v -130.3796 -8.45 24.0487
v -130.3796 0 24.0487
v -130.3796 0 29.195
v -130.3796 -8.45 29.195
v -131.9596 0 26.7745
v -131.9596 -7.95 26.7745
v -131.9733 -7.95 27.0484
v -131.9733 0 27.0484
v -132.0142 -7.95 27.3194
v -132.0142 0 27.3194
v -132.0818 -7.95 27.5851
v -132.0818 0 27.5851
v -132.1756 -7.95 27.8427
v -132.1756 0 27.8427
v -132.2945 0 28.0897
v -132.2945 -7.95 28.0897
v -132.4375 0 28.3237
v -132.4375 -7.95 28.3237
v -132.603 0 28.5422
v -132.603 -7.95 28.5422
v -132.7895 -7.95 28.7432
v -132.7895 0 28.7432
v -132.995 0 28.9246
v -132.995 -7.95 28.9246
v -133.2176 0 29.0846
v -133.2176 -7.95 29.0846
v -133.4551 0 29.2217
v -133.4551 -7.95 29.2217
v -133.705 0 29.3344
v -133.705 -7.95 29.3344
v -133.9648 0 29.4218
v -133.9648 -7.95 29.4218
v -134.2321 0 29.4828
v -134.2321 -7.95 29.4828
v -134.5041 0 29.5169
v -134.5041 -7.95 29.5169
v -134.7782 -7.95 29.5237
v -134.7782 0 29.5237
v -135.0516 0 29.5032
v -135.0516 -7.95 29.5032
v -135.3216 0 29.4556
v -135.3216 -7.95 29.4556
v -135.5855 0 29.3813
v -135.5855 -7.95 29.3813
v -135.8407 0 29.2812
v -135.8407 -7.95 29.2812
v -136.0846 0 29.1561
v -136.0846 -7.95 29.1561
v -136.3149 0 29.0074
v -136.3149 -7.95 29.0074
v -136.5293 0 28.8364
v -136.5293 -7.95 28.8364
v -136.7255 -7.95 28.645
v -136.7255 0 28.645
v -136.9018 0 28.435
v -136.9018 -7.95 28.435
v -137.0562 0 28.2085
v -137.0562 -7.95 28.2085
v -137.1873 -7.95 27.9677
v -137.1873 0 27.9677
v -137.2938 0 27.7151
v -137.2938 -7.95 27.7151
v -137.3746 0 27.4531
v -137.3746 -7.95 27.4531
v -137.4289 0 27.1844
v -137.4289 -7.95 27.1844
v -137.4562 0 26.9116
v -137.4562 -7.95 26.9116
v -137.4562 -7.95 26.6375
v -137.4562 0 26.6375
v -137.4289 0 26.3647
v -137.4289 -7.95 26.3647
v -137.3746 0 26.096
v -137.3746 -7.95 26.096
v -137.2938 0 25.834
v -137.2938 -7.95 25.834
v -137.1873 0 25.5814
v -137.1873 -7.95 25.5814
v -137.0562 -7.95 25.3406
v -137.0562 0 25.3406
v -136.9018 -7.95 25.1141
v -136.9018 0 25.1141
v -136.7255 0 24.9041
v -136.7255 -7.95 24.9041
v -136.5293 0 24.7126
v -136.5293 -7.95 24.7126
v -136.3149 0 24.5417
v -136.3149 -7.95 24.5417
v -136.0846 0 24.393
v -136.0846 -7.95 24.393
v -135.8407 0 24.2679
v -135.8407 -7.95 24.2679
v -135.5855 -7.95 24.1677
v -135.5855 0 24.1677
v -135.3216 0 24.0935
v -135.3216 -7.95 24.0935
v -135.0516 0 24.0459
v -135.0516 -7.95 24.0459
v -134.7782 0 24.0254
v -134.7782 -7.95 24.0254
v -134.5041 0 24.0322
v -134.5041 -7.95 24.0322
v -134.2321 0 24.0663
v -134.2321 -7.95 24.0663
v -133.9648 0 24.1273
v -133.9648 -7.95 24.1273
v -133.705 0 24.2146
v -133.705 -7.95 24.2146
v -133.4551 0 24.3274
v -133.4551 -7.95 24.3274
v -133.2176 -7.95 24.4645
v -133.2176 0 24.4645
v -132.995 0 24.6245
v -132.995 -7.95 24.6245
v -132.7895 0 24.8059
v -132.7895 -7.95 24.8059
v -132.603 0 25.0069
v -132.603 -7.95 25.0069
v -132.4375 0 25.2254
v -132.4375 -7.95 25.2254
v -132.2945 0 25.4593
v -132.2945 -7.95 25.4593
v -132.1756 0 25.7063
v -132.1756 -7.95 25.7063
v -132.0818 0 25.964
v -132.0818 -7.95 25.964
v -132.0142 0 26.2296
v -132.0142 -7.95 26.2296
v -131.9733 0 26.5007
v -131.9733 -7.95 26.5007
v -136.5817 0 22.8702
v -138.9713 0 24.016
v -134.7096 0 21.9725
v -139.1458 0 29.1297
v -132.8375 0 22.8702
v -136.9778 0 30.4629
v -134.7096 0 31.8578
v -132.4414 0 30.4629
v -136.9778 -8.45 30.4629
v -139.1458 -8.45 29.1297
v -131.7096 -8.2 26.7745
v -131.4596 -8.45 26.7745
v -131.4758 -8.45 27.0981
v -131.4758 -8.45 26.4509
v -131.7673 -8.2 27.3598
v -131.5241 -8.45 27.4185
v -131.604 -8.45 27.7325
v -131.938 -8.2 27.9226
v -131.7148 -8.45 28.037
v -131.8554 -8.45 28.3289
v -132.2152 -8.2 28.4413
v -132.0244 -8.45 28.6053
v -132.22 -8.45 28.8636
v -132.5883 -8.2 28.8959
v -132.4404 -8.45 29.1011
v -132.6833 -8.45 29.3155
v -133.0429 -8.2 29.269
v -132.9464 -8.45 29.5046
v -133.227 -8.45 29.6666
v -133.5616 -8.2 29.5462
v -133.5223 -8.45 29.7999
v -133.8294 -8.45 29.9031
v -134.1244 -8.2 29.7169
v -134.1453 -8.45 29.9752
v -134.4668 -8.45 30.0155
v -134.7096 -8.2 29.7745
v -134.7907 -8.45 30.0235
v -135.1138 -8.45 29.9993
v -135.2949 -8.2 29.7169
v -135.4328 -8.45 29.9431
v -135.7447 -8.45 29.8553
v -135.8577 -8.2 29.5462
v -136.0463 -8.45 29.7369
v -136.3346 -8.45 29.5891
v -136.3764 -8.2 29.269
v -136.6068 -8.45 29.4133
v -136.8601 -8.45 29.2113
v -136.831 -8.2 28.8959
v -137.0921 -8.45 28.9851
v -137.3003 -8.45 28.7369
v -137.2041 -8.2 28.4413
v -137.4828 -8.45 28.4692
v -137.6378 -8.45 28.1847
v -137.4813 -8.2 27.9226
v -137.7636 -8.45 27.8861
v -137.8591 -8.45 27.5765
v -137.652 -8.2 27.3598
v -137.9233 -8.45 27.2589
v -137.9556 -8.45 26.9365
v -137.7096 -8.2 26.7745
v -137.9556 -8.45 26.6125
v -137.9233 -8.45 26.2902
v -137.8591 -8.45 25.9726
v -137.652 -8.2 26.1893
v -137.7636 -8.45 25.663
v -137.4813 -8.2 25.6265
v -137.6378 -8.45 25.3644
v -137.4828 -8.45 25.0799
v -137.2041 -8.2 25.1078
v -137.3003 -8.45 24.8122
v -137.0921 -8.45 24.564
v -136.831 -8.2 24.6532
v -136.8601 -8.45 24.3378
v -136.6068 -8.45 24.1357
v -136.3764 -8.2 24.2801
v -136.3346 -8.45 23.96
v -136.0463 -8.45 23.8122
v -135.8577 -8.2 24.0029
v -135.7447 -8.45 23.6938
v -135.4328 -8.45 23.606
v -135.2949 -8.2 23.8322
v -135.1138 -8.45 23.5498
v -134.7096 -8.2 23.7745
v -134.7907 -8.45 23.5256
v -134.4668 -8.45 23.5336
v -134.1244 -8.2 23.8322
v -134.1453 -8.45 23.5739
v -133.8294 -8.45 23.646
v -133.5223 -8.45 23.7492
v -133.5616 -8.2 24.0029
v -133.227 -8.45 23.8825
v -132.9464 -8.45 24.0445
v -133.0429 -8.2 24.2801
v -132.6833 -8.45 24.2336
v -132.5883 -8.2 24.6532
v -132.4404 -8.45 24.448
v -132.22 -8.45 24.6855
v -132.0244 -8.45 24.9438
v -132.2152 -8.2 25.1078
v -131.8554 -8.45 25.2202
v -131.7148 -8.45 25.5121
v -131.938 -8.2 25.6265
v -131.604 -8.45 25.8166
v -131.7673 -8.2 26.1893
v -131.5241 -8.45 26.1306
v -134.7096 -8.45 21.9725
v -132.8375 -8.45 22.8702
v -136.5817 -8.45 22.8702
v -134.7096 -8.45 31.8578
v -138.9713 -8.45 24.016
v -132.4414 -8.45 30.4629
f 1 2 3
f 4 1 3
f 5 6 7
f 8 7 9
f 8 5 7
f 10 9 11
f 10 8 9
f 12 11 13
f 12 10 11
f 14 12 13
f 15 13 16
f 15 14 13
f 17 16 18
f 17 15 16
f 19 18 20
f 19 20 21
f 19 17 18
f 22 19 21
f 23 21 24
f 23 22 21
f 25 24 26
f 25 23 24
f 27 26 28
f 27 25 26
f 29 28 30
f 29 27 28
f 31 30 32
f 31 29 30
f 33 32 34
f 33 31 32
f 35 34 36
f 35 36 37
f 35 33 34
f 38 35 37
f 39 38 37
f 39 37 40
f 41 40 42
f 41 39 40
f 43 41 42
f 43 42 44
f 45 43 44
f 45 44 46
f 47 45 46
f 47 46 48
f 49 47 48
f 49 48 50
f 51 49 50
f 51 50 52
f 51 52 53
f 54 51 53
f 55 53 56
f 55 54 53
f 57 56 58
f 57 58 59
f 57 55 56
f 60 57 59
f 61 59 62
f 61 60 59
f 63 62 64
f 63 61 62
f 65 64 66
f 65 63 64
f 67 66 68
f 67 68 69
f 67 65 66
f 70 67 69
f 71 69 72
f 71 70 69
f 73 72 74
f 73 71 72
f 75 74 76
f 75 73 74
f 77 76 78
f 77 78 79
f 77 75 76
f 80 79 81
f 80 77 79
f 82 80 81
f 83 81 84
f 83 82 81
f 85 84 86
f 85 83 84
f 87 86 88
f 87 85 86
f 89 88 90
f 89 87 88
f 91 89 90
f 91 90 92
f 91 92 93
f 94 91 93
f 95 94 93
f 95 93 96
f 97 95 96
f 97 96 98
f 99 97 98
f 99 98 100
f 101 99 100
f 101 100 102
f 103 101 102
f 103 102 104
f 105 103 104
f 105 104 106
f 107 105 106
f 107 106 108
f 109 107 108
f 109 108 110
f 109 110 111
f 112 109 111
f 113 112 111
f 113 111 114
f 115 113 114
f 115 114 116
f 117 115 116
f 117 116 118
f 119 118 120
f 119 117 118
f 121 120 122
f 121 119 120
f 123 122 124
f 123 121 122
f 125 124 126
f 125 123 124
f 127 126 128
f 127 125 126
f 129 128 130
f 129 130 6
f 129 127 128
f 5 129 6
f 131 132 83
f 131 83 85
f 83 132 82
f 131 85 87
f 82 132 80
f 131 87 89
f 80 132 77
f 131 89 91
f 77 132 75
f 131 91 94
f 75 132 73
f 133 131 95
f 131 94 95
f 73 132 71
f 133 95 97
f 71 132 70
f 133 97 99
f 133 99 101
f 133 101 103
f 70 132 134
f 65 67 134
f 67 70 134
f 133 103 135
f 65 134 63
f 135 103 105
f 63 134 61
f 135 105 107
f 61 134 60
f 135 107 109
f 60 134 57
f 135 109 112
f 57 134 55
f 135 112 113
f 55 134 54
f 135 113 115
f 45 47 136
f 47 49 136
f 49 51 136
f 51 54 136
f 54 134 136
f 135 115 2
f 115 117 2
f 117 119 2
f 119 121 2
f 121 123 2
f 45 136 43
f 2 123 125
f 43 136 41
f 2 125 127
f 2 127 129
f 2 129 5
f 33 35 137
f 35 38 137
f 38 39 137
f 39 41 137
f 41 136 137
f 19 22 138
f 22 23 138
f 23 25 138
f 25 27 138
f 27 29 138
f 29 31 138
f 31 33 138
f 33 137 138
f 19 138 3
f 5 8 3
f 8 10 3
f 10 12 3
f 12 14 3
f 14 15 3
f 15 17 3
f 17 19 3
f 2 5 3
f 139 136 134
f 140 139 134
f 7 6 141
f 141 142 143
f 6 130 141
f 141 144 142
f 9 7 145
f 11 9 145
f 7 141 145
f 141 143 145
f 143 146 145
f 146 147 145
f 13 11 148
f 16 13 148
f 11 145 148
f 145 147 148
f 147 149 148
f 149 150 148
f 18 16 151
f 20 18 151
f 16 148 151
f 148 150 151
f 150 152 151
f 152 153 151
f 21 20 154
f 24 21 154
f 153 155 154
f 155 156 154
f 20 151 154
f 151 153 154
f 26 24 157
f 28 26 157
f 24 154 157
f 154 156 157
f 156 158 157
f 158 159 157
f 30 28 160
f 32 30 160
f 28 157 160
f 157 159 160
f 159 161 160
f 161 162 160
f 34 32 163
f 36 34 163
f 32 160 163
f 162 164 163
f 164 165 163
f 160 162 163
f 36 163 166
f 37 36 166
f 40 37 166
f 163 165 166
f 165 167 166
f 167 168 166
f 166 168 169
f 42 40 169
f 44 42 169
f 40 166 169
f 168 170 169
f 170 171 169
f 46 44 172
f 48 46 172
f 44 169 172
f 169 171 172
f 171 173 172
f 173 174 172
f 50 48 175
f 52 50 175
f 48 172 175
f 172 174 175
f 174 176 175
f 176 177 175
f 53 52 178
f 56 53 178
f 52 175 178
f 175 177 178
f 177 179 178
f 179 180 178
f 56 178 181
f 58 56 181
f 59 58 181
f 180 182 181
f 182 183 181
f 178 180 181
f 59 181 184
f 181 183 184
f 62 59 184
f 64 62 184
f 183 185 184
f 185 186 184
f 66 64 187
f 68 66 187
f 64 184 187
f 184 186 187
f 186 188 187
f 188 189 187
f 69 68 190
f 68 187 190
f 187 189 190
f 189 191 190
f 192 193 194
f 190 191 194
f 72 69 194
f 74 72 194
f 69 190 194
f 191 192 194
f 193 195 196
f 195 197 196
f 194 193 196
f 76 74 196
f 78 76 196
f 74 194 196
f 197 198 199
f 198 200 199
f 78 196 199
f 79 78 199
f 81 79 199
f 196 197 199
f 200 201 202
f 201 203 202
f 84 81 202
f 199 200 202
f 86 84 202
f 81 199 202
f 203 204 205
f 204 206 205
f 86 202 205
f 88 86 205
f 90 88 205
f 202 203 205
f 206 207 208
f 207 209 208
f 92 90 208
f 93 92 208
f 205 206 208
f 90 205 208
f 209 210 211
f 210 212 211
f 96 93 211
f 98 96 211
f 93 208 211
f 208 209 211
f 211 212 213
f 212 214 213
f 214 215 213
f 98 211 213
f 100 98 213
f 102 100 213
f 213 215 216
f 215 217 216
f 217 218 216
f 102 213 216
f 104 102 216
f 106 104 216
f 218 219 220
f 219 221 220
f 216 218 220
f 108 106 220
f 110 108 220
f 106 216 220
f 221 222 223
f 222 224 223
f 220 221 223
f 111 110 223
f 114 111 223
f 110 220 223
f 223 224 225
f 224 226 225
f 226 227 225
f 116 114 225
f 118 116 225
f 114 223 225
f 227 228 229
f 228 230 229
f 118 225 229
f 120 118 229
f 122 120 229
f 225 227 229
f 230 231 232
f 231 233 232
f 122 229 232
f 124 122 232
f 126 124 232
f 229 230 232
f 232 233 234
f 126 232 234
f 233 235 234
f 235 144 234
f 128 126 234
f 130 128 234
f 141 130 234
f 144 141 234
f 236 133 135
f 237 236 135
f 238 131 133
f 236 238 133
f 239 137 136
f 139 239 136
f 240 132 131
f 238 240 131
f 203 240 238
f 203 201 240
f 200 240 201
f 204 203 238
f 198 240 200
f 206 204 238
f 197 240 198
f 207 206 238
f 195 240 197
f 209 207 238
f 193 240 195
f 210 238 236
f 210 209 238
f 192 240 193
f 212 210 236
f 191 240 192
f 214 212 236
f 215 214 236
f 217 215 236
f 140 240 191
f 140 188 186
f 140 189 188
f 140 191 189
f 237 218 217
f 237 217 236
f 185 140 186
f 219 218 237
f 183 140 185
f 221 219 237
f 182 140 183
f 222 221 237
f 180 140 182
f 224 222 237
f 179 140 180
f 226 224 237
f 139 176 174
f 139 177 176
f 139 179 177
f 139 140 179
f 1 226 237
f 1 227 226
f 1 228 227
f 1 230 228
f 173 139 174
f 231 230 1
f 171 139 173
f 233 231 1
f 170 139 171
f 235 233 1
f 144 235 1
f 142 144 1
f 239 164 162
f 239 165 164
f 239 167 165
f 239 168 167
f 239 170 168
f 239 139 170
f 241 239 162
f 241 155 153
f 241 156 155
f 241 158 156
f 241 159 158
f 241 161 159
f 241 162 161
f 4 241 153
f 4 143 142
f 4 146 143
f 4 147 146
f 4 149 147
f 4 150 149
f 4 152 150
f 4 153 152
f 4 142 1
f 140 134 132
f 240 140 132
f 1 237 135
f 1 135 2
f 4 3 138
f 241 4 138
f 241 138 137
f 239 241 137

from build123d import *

# Parameters (mm, degrees)
F0_R     = 2.75
F1_DEPTH = 8.45
F2_SIZE  = 0.5


with BuildPart() as f1:
    # F0 (on Front) → F1 (new body)
    with BuildSketch(Plane.XZ):
        with BuildLine():
            ThreePointArc((-132.8375352313, 22.8701725471), (-131.0452779523, 24.467741248), (-130.3796414733, 26.7745442275))
            ThreePointArc((-130.3796414733, 26.7745442275), (-130.9300791601, 28.887316984), (-132.441446887, 30.4629305032))
            ThreePointArc((-132.441446887, 30.4629305032), (-134.7096414781, 31.1045442275), (-136.9778360677, 30.4629304982))
            ThreePointArc((-136.9778360677, 30.4629304982), (-139.0337617379, 26.5489695453), (-136.5817476464, 22.8701725141))
            ThreePointArc((-136.5817476464, 22.8701725141), (-134.7096414351, 22.4445442275), (-132.8375352313, 22.8701725471))
        make_face()
        with Locations((-134.7096414733, 26.7745442275)):
            Circle(F0_R, mode=Mode.SUBTRACT)
        with BuildLine():
            Line((-130.3796414733, 24.0487074352), (-130.3796414733, 26.7745442275))
            ThreePointArc((-130.3796414733, 26.7745442275), (-131.0452779523, 24.467741248), (-132.8375352313, 22.8701725471))
            Line((-132.8375352313, 22.8701725471), (-130.3796414733, 24.0487074352))
        make_face()
        with BuildLine():
            ThreePointArc((-132.441446887, 30.4629305032), (-130.9300791601, 28.887316984), (-130.3796414733, 26.7745442275))
            Line((-130.3796414733, 26.7745442275), (-130.3796414733, 29.1950113514))
            Line((-130.3796414733, 29.1950113514), (-132.441446887, 30.4629305032))
        make_face()
        with BuildLine():
            ThreePointArc((-136.9778360677, 30.4629304982), (-134.7096414781, 31.1045442275), (-132.441446887, 30.4629305032))
            Line((-132.441446887, 30.4629305032), (-134.7096414733, 31.8577698691))
            Line((-134.7096414733, 31.8577698691), (-136.9778360677, 30.4629304982))
        make_face()
        with BuildLine():
            Line((-134.7096414733, 21.9725167744), (-132.8375352313, 22.8701725471))
            ThreePointArc((-132.8375352313, 22.8701725471), (-134.7096414351, 22.4445442275), (-136.5817476464, 22.8701725141))
            Line((-136.5817476464, 22.8701725141), (-134.7096414733, 21.9725167744))
        make_face()
        with BuildLine():
            ThreePointArc((-136.5817476464, 22.8701725141), (-139.0337617379, 26.5489695453), (-136.9778360677, 30.4629304982))
            Line((-136.9778360677, 30.4629304982), (-139.1458009268, 29.1297279821))
            Line((-139.1458009268, 29.1297279821), (-138.971331925, 24.0159537063))
            Line((-138.971331925, 24.0159537063), (-136.5817476464, 22.8701725141))
        make_face()
    extrude(amount=F1_DEPTH)

    # F2
    f2_edges = [f1.edges().sort_by_distance(p)[0] for p in [
        (-137.459641, -8.45, 26.774544),
    ]]
    chamfer(f2_edges, length=F2_SIZE)


solid = f1.part
